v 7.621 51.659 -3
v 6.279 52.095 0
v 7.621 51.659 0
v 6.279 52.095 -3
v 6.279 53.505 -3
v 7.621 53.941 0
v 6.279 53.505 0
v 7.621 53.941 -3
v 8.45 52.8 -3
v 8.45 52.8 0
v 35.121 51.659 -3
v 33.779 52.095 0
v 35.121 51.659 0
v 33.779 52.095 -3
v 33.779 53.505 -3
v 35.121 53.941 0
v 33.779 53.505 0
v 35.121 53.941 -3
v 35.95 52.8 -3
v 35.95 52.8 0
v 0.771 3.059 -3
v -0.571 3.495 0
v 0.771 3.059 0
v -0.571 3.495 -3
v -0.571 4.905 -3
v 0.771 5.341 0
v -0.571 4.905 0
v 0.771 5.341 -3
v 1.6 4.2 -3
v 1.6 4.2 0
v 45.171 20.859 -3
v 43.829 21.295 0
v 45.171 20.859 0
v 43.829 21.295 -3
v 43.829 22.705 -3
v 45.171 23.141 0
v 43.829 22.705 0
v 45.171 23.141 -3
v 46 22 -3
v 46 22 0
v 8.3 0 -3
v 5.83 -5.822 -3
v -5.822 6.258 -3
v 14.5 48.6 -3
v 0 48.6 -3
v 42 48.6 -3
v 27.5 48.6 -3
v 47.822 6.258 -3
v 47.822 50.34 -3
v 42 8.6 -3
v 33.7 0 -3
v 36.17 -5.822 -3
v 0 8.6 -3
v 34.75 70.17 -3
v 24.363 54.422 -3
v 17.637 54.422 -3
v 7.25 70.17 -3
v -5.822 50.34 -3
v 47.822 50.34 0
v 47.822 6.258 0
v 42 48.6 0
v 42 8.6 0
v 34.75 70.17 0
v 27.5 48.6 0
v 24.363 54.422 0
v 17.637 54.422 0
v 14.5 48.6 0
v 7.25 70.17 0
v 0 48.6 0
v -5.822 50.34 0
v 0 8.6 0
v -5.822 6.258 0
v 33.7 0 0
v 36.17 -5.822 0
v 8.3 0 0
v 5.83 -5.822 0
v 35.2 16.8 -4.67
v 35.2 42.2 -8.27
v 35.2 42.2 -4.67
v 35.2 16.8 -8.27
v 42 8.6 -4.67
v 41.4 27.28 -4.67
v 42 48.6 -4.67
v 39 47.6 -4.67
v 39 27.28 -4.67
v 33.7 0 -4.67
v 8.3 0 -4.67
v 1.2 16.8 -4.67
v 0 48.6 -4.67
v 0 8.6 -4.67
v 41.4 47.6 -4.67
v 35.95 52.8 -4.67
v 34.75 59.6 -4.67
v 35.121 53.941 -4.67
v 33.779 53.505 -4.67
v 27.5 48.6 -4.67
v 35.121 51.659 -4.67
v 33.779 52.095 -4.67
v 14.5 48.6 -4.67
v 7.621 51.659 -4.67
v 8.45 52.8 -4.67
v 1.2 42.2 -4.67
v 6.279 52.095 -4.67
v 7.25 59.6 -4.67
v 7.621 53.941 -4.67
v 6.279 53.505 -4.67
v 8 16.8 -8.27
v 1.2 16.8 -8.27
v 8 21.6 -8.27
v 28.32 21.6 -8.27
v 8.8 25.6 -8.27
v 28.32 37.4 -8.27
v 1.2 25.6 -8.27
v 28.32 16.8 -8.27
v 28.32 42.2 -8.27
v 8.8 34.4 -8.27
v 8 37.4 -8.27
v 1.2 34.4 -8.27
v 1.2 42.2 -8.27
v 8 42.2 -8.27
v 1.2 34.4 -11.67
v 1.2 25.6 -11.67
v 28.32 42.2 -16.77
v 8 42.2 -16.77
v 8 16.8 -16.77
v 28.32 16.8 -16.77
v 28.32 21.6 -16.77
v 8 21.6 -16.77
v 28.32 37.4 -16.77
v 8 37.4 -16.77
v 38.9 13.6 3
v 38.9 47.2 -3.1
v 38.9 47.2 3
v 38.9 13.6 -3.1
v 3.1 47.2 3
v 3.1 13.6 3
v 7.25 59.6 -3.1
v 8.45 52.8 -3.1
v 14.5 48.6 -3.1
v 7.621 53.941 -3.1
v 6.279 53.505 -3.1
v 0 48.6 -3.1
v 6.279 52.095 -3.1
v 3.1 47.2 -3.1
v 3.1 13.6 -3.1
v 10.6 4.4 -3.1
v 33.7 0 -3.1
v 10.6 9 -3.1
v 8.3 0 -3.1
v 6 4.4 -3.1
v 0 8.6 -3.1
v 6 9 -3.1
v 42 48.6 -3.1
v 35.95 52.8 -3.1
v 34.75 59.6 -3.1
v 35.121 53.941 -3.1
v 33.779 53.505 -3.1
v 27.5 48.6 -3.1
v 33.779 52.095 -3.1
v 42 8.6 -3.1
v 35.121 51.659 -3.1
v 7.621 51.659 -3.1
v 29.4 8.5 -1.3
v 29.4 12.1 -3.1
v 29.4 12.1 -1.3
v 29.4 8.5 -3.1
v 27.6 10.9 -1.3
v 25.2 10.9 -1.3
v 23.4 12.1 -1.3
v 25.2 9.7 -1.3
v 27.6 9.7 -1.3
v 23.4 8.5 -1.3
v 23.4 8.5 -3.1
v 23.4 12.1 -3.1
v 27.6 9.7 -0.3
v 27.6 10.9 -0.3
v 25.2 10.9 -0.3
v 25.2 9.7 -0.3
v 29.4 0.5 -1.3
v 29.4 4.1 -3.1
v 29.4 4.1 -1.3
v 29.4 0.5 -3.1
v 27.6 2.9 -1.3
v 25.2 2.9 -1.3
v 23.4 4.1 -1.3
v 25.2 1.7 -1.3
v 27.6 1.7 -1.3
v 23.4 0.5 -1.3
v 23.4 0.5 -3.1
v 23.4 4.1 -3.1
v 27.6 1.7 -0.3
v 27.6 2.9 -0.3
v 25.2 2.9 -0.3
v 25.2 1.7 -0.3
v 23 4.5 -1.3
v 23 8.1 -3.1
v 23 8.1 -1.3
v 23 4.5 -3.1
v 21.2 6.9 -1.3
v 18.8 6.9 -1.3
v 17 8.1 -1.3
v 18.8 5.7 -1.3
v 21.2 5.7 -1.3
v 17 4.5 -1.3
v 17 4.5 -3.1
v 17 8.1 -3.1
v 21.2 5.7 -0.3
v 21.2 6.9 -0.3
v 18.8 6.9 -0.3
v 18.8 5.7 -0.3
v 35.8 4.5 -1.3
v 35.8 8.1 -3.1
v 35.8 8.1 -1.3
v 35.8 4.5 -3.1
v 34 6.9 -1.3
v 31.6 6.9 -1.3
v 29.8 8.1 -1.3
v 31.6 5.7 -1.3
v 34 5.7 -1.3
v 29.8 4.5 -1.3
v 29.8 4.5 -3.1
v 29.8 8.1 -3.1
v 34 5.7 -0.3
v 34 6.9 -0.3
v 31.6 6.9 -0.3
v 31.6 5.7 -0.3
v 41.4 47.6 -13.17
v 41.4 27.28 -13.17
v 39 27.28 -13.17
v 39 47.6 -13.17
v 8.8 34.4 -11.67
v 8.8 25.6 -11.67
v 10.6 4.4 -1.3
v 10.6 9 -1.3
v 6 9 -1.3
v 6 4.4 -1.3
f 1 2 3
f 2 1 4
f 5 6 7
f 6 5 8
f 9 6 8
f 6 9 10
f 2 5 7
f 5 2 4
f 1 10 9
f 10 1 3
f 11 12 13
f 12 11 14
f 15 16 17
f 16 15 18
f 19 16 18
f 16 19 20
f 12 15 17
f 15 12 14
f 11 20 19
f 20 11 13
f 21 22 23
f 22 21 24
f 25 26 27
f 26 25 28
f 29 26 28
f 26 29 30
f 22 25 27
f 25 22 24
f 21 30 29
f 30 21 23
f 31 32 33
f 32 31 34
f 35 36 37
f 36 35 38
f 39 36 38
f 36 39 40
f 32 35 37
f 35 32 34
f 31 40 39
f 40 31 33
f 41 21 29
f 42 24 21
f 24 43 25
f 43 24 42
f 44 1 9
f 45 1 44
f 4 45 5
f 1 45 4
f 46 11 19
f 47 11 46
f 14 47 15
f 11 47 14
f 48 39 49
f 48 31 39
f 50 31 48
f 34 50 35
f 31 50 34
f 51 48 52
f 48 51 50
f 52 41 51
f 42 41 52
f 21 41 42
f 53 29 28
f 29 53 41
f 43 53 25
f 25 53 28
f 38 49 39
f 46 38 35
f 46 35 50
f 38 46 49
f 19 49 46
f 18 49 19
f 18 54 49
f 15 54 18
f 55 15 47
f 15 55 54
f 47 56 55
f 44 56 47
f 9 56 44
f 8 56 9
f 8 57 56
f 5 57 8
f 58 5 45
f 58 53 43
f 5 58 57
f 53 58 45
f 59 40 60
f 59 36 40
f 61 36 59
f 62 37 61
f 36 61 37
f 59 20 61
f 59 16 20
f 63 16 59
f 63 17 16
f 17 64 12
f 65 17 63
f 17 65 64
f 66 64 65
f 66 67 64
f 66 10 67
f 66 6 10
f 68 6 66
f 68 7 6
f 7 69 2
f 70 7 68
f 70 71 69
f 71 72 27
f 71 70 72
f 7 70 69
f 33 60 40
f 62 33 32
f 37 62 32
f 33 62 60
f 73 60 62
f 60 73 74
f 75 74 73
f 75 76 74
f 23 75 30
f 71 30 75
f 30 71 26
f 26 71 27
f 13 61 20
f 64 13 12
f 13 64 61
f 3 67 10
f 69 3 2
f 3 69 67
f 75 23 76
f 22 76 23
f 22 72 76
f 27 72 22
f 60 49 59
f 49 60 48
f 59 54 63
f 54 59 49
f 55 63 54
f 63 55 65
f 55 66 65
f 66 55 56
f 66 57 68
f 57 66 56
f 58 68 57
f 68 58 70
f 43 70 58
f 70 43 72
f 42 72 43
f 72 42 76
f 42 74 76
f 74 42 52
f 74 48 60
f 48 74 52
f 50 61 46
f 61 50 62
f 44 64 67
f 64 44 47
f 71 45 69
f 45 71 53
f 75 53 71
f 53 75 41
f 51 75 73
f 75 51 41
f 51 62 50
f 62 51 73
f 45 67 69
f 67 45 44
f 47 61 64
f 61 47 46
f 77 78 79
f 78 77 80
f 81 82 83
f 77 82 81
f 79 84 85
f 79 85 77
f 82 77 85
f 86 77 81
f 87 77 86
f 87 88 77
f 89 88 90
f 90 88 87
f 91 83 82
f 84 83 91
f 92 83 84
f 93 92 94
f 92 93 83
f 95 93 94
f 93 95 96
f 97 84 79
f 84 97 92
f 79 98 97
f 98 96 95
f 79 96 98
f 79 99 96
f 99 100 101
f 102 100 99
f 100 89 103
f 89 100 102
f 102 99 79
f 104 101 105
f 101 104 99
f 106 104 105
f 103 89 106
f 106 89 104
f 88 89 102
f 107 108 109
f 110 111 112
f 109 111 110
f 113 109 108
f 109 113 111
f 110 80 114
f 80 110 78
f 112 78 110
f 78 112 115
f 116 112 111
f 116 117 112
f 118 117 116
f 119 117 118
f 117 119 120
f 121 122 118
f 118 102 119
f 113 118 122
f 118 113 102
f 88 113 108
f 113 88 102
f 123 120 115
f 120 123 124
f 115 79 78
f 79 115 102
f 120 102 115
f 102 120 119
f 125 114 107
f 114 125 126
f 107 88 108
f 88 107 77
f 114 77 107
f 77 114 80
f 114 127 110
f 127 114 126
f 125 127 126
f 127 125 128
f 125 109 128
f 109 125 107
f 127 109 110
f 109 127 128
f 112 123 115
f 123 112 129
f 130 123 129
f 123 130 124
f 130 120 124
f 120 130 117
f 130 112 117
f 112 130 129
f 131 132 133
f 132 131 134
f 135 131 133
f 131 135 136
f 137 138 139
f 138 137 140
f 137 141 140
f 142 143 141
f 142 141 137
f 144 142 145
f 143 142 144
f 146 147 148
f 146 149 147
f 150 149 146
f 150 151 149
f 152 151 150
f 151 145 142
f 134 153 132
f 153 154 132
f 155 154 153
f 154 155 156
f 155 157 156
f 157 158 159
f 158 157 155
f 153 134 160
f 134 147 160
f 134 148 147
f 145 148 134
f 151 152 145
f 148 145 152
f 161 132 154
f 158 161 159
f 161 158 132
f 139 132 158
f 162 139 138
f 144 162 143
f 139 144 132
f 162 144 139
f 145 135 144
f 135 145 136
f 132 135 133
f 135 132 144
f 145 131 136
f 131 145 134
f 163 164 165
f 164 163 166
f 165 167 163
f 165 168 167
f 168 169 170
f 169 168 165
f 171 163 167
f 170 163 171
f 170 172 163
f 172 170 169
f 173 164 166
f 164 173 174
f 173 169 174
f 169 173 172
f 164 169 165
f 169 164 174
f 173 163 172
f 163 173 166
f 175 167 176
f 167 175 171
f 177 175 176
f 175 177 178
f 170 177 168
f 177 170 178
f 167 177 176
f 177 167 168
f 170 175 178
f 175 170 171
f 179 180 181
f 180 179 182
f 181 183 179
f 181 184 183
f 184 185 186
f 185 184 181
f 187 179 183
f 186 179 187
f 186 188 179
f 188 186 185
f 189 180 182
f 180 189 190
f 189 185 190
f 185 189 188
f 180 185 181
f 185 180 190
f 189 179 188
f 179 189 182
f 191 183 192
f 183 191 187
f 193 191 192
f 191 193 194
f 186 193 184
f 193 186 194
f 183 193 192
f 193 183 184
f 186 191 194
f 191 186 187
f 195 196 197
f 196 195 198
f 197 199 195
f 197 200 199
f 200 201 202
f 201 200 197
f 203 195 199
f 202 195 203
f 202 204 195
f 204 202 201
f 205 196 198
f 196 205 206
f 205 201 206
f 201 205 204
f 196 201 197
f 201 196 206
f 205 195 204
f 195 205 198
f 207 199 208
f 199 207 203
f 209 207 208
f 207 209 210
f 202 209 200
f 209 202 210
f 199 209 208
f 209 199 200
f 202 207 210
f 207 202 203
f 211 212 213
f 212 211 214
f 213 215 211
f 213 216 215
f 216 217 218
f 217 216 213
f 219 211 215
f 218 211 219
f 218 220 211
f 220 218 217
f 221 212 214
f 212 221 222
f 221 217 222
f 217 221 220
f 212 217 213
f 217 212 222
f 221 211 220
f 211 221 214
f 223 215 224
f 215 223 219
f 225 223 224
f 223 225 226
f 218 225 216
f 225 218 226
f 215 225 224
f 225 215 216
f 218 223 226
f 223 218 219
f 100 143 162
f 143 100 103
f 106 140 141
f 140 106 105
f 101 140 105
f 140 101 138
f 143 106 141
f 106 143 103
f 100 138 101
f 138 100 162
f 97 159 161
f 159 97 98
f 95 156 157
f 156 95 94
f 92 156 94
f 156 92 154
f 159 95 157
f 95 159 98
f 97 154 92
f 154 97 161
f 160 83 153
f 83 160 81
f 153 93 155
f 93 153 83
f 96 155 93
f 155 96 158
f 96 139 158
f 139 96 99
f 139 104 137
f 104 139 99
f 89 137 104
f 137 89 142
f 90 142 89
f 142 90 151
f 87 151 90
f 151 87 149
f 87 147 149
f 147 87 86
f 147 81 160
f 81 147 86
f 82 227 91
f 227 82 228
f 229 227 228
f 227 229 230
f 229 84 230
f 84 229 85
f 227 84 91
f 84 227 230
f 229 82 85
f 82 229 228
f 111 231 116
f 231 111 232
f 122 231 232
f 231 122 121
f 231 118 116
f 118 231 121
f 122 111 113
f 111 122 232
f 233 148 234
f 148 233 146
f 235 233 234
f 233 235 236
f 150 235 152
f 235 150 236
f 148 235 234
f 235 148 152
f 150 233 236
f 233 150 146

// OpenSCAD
// file: ../../libs/screw-sizes.scad
// From: https://www.trfastenings.com/knowledge-base/fundamentals/tapping-sizes-and-clearance-holes
allScrewSizes = [
  ["m1",    1.2],
  ["m1.2",  1.4],
  ["m1.4",  1.6],
  ["m1.6",  1.8],
  ["m1.8",  2],
  ["m2",    2.4],
  ["m2.2",  2.8],
  ["m2.5",  2.9],
  ["m3",    3.4],
  ["m3.5",  3.9],
  ["m4",    4.5],
  ["m5",    5.5],
  ["m6",    6.6],
  ["m8",    9],
  ["m10",   11],
  ["m12",   13.5],
  ["m14",   15.5],
  ["m16",   17.5],
  ["m18",   20],
  ["m20",   22],
  ["m22",   24],
  ["m24",   26],
  ["m27",   30],
  ["m30",   33],
];

function screwDiameter(id) = allScrewSizes[search([id], allScrewSizes)[0]][1];
// file: ../../libs/flat-ui-colors.scad
flatui = [
    "#1abc9c",
    "#2ecc71",
    "#3498db",
    "#9b59b6",
    "#34495e",
    "#f1c40f",
    "#e67e22",
    "#e74c3c",
    "#ecf0f1",
    "#95a5a6",
];
// main file
include <../../libs/flat-ui-colors.scad>;
include <../../libs/screw-sizes.scad>;

pcbThickness = 1.57;
acrylicThickness = 3;

m2D = screwDiameter("m2");

earTipLeftX = 7.25;
earTipRightX = 34.75;
earTipsY = 59.6;

pcbCoreX = 42;
pcbCoreY = 48.6;

s2InsetX = 1.2;
s2MiniPCBTop = 3.6;

header8x1X = 2.4;
header8x1Y = 20.32;
header8x1Z = 8.5;

switchX = 6;
switchY = 3.6;
switchZ = 1.8;
btnX = 2.4;
btnY = 1.2;
btnZ = 1;

caseLeftX = -5.822;
caseRightX = 47.822;

displayPCBW = 35.8;
displayPCBD = 33.6;
displayPCBH = 6.1;
displayX = (pcbCoreX - displayPCBW) / 2;
displayY = 47.2-displayPCBD;
displaySpace = 1;

usbPortW = 7.6;
usbPortD = 8.8;
usbPortH = 3.4;
usbX = s2InsetX;
usbY = pcbCoreY - usbPortD - 14.2;
usbZ = -usbPortH-s2MiniPCBTop;

miniX = 34;
miniY = 25.4;
miniZ = 3.6;

miniYInset = 6.4;
s2HeadersX = 8;
s2HeadersBottomY = pcbCoreY-miniY-miniYInset;
s2HeadersTopY = pcbCoreY-miniYInset-(header8x1X*2);

neoPixelHeaderX = pcbCoreX-header8x1X-0.6;
neoPixelHeaderY = 47.6-header8x1Y;
neoPixelHeaderZ = -header8x1Z;

layoutPadding = pcbCoreX + 14;

ledWH = 4.6;
ledH = 1.8;
ledX = 6;
ledY = 9 - ledWH;

dpadCol1X = 17;
dpadCol2X = dpadCol1X + 0.4 + switchX;
dpadCol3X = dpadCol2X + 0.4 + switchX;

dpadRow1Y = 0.5;
dpadRow2Y = dpadRow1Y + 0.4 + switchY;
dpadRow3Y = dpadRow2Y + 0.4 + switchY;

module partsEarHoles(h=pcbThickness) {
    holeY = earTipsY - 5.6 - (m2D/2);
    translate([earTipLeftX, holeY, -h]) cylinder(h*3, d=m2D, true);
    translate([earTipRightX, holeY, -h]) cylinder(h*3, d=m2D, true);
}

module partsNeoPixelHeader() {
    translate([neoPixelHeaderX, neoPixelHeaderY, neoPixelHeaderZ]) cube([header8x1X, header8x1Y, header8x1Z]);
}

module partsUSBPort() {
    color([1, 1, 1]) translate([usbX, usbY, usbZ]) cube([usbPortW, usbPortD, usbPortH]);
}

module partsS2Mini() {
    translate([s2InsetX, pcbCoreY-miniY-miniYInset, -miniZ]) cube([miniX, miniY, miniZ]);
    
    // Double to account for male pins
    translate([s2HeadersX, s2HeadersBottomY, -header8x1Z-s2MiniPCBTop]) cube([header8x1Y, header8x1X*2, header8x1Z]);
    
    translate([s2HeadersX, s2HeadersTopY, -header8x1Z-s2MiniPCBTop]) cube([header8x1Y, header8x1X*2, header8x1Z]);
}

module partDisplay() {
    translate([displayX, displayY, pcbThickness]) cube([displayPCBW, displayPCBD, displayPCBH]);
    
    displayInnerX = 34.4;
    displayInnerY = 22.8;
    displayInnerZ = 6.4;
    
    // Currently not used but pulled from 3D Print Model
    // displayVisibleX = 32;
    // displayVisibleY = 20;
    translate([(pcbCoreX - displayInnerX) / 2, pcbCoreY - displayInnerY - 7.2, 0]) cube([displayInnerX, displayInnerY, displayInnerZ]);
}

module partLED(h = ledH) {
    translate([ledX, ledY, pcbThickness]) cube([ledWH, ledWH, h]);
}

module partDPadSwitch() {
    cube([switchX, switchY, switchZ]);
    color([1,1,1]) translate([(switchX - btnX)/2, (switchY - btnY)/2, switchZ]) cube([btnX, btnY, btnZ]);
}

module partDPad() {    
    leftRightY = 8.2 - switchY;
    // UP
    translate([dpadCol2X, dpadRow3Y, pcbThickness]) partDPadSwitch();
    
    // Down
    translate([dpadCol2X, dpadRow1Y, pcbThickness]) partDPadSwitch();

    // Left
    translate([dpadCol1X, dpadRow2Y, pcbThickness]) partDPadSwitch();

    // Right
    translate([dpadCol3X, dpadRow2Y, pcbThickness]) partDPadSwitch();
}

module nuggetPCB(h=pcbThickness) {
    partsNeoPixelHeader();
    partsUSBPort();
    partsS2Mini();
    partDisplay();
    partLED();
    partDPad();
    
    color([0, 0, 0]) difference() {
        linear_extrude(height = h, center = false, convexity = 10, twist = 0)
        polygon(
            points=[
                [0, 8.6],
                [0, pcbCoreY],
                [earTipLeftX, earTipsY],
                [14.5, pcbCoreY],
                [27.5, pcbCoreY],
                [earTipRightX, earTipsY],
                [pcbCoreX, pcbCoreY],
                [pcbCoreX, 8.6],
                [33.7, 0],
                [8.3, 0],
            ]
        );
        
        partsEarHoles();
    }
}

module usbSpace(h=acrylicThickness) {
    space = 2;
    translate([-10, usbY - space, -h]) cube([12, usbPortD + (space*2), h * 3]);
}

module backHeadersSpace(h=acrylicThickness) {
    // s2HeadersX
    space = 1;
    translate([s2HeadersX-space, s2HeadersBottomY-space, -h]) cube([header8x1Y + (space * 2), (header8x1X*2) + (space * 2), h * 3]);
    
    translate([s2HeadersX-space, s2HeadersTopY-space, -h]) cube([header8x1Y + (space * 2), (header8x1X*2) + (space * 2), h * 3]);
    
    translate([neoPixelHeaderX-space, neoPixelHeaderY-space, -h]) cube([header8x1X + (space * 2), header8x1Y + (space * 2), h * 3]);
}

module ledSpace(h = acrylicThickness) {
    space = 2;
    wh = ledWH + space;
    translate([ledX - (space/2), ledY - (space/2), -h]) cube([wh, wh, h * 3]);
}

module displaySpace(h = acrylicThickness) {
    translate([displayX - (displaySpace/2), displayY - (displaySpace/2), -h]) cube([displayPCBW + displaySpace, displayPCBD + displaySpace, h * 3]);
}

module barrierAddition(h = acrylicThickness, excludeBottom=false) {
    // Bottom barrier
    if (!excludeBottom) {
        linear_extrude(height = h, center = false, convexity = 10, twist = 0)
        polygon(
            points=[
                [0, 1.5],
                [42, 1.5],
                [33.7, 0],
                [8.3, 0],
            ]
        );
    }
    
    // Ear barrier
    difference() {
        union() {
            linear_extrude(height = h, center = false, convexity = 10, twist = 0)
            polygon(
                points=[
                    [0, 48.6],
                    [7.25, 59.6],
                    [14.5, 48.6],
                ]
            );
            
            linear_extrude(height = h, center = false, convexity = 10, twist = 0)
            polygon(
                points=[
                    [0+27.5, 48.6],
                    [7.25+27.5, 59.6],
                    [14.5+27.5, 48.6],
                ]
            );
        }
        screwHoles();
    }
}

module screwHoles() {
    partsEarHoles(h=100);
    translate([0.4, 4.2, -16]) cylinder(100, d=m2D, true);
    translate([44.8, 22, -16]) cylinder(100, d=m2D, true);
}

module nuggetLayer(h=acrylicThickness) {
    difference() {
        linear_extrude(height = h, center = false, convexity = 10, twist = 0)
        polygon(
            points=[
                [caseLeftX, 6.258],
                [caseLeftX, 50.34],
                [7.25, 70.17],
                [17.637, 54.422],
                [24.363, 54.422],
                [34.75, 70.17],
                [caseRightX, 50.34],
                [caseRightX, 6.258],
                [36.170, caseLeftX],
                [5.830, caseLeftX],
            ]
        );
            screwHoles();
    }
}

module nuggetLowerLayer(h=acrylicThickness) {
    
    color(flatui[2]) union() {
        difference() {
            nuggetLayer(h);
            translate([0, 0, -h/2]) nuggetPCB(h=h*2);
            usbSpace(h=h*2);
        }
        
        barrierAddition();
    }
}

module nuggetScrewLayer(h=acrylicThickness) {
    color(flatui[1]) difference() {
        union() {
            difference() {
                nuggetLayer(h);
                translate([0, 0, -h]) nuggetPCB(h=h*3);
            }
            
            barrierAddition();
        }
        usbSpace();
        translate([0, 0, 1.5]) nuggetPCB(h=3);
    }
}

module nuggetUpperLayer(h=acrylicThickness) {
    color(flatui[3]) union() {
        difference() {
            nuggetLayer(h);
            translate([0, 0, -h]) nuggetPCB(h=h*3);
        }
        barrierAddition(excludeBottom=true);
    }
}

module nuggetDPadLayer(h=acrylicThickness) {
    color(flatui[4]) union() {
        difference() {
            nuggetLayer(h);
            
            ledSpace();
            displaySpace();
            dpadButtons();
        }
        barrierAddition(excludeBottom = true);
    }
}

module nuggetScreenLayer(h=acrylicThickness) {
    color(flatui[6]) difference() {
        nuggetLayer();
        // Remove bottom section
        translate([caseLeftX-5,displayY-displaySpace-0.25-50,-h]) cube([53.644 + 10, 50, h * 3]);
    }
}

module nuggetBack(h=acrylicThickness) {
    color(flatui[7]) difference() {
        nuggetLayer(h);
        backHeadersSpace(h);
        usbSpace(h);
    }
}

module dpadButtons(h=acrylicThickness) {
    cutSize = 0.25;
    
    // UP
    translate([dpadCol2X+(switchX/2), dpadRow3Y+((switchY)/2), 0])
    cylinder(h*3, d=m2D, true);
    
    // DOWN
    translate([dpadCol2X+(switchX/2), dpadRow1Y+((switchY)/2), 0])
    cylinder(h*3, d=m2D, true);
    
    // LEFT
    translate([dpadCol1X+(switchX/2), dpadRow2Y+((switchY)/2), 0])
    cylinder(h*3, d=m2D, true);
    
    // Right
    translate([dpadCol3X+(switchX/2), dpadRow2Y+((switchY)/2), 0])
    cylinder(h*3, d=m2D, true);
    
}

module caseLayers() {
    //nuggetDPadLayer();
    // translate([0,0, acrylicThickness]) nuggetScreenLayer();
    translate([0, 0, -acrylicThickness]) nuggetUpperLayer();
    //translate([0, 0, -acrylicThickness*2]) nuggetScrewLayer();
    //translate([0, 0, -acrylicThickness*3]) nuggetLowerLayer();
    //translate([0, 0, -acrylicThickness*4]) nuggetLowerLayer();
    //translate([0, 0, -acrylicThickness*5]) nuggetBack();
    
    translate([0, 0, -pcbThickness-displayPCBH + 3]) nuggetPCB();
}

module layout() {
    nuggetScrewLayer();
    translate([layoutPadding, 0, 0]) nuggetDPadLayer();
    translate([layoutPadding * 2, 0, 0]) nuggetUpperLayer();
    translate([layoutPadding * 3, 0, 0]) nuggetScreenLayer();
    translate([layoutPadding * 4, 0, 0]) nuggetLowerLayer();
    translate([layoutPadding * 5, 0, 0]) nuggetLowerLayer();
    translate([pcbCoreX + (layoutPadding * 6), 0, 0]) rotate([0, 180, 0]) nuggetBack();
}

module model() {
    caseLayers();
}

module laserDesign() {
    $fn=20;
    projection(cut = true) translate([-layoutPadding, 0, -acrylicThickness / 2]) nuggetScrewLayer();
    projection(cut = false) translate([0, 0, -acrylicThickness / 2]) layout();
}

model();
